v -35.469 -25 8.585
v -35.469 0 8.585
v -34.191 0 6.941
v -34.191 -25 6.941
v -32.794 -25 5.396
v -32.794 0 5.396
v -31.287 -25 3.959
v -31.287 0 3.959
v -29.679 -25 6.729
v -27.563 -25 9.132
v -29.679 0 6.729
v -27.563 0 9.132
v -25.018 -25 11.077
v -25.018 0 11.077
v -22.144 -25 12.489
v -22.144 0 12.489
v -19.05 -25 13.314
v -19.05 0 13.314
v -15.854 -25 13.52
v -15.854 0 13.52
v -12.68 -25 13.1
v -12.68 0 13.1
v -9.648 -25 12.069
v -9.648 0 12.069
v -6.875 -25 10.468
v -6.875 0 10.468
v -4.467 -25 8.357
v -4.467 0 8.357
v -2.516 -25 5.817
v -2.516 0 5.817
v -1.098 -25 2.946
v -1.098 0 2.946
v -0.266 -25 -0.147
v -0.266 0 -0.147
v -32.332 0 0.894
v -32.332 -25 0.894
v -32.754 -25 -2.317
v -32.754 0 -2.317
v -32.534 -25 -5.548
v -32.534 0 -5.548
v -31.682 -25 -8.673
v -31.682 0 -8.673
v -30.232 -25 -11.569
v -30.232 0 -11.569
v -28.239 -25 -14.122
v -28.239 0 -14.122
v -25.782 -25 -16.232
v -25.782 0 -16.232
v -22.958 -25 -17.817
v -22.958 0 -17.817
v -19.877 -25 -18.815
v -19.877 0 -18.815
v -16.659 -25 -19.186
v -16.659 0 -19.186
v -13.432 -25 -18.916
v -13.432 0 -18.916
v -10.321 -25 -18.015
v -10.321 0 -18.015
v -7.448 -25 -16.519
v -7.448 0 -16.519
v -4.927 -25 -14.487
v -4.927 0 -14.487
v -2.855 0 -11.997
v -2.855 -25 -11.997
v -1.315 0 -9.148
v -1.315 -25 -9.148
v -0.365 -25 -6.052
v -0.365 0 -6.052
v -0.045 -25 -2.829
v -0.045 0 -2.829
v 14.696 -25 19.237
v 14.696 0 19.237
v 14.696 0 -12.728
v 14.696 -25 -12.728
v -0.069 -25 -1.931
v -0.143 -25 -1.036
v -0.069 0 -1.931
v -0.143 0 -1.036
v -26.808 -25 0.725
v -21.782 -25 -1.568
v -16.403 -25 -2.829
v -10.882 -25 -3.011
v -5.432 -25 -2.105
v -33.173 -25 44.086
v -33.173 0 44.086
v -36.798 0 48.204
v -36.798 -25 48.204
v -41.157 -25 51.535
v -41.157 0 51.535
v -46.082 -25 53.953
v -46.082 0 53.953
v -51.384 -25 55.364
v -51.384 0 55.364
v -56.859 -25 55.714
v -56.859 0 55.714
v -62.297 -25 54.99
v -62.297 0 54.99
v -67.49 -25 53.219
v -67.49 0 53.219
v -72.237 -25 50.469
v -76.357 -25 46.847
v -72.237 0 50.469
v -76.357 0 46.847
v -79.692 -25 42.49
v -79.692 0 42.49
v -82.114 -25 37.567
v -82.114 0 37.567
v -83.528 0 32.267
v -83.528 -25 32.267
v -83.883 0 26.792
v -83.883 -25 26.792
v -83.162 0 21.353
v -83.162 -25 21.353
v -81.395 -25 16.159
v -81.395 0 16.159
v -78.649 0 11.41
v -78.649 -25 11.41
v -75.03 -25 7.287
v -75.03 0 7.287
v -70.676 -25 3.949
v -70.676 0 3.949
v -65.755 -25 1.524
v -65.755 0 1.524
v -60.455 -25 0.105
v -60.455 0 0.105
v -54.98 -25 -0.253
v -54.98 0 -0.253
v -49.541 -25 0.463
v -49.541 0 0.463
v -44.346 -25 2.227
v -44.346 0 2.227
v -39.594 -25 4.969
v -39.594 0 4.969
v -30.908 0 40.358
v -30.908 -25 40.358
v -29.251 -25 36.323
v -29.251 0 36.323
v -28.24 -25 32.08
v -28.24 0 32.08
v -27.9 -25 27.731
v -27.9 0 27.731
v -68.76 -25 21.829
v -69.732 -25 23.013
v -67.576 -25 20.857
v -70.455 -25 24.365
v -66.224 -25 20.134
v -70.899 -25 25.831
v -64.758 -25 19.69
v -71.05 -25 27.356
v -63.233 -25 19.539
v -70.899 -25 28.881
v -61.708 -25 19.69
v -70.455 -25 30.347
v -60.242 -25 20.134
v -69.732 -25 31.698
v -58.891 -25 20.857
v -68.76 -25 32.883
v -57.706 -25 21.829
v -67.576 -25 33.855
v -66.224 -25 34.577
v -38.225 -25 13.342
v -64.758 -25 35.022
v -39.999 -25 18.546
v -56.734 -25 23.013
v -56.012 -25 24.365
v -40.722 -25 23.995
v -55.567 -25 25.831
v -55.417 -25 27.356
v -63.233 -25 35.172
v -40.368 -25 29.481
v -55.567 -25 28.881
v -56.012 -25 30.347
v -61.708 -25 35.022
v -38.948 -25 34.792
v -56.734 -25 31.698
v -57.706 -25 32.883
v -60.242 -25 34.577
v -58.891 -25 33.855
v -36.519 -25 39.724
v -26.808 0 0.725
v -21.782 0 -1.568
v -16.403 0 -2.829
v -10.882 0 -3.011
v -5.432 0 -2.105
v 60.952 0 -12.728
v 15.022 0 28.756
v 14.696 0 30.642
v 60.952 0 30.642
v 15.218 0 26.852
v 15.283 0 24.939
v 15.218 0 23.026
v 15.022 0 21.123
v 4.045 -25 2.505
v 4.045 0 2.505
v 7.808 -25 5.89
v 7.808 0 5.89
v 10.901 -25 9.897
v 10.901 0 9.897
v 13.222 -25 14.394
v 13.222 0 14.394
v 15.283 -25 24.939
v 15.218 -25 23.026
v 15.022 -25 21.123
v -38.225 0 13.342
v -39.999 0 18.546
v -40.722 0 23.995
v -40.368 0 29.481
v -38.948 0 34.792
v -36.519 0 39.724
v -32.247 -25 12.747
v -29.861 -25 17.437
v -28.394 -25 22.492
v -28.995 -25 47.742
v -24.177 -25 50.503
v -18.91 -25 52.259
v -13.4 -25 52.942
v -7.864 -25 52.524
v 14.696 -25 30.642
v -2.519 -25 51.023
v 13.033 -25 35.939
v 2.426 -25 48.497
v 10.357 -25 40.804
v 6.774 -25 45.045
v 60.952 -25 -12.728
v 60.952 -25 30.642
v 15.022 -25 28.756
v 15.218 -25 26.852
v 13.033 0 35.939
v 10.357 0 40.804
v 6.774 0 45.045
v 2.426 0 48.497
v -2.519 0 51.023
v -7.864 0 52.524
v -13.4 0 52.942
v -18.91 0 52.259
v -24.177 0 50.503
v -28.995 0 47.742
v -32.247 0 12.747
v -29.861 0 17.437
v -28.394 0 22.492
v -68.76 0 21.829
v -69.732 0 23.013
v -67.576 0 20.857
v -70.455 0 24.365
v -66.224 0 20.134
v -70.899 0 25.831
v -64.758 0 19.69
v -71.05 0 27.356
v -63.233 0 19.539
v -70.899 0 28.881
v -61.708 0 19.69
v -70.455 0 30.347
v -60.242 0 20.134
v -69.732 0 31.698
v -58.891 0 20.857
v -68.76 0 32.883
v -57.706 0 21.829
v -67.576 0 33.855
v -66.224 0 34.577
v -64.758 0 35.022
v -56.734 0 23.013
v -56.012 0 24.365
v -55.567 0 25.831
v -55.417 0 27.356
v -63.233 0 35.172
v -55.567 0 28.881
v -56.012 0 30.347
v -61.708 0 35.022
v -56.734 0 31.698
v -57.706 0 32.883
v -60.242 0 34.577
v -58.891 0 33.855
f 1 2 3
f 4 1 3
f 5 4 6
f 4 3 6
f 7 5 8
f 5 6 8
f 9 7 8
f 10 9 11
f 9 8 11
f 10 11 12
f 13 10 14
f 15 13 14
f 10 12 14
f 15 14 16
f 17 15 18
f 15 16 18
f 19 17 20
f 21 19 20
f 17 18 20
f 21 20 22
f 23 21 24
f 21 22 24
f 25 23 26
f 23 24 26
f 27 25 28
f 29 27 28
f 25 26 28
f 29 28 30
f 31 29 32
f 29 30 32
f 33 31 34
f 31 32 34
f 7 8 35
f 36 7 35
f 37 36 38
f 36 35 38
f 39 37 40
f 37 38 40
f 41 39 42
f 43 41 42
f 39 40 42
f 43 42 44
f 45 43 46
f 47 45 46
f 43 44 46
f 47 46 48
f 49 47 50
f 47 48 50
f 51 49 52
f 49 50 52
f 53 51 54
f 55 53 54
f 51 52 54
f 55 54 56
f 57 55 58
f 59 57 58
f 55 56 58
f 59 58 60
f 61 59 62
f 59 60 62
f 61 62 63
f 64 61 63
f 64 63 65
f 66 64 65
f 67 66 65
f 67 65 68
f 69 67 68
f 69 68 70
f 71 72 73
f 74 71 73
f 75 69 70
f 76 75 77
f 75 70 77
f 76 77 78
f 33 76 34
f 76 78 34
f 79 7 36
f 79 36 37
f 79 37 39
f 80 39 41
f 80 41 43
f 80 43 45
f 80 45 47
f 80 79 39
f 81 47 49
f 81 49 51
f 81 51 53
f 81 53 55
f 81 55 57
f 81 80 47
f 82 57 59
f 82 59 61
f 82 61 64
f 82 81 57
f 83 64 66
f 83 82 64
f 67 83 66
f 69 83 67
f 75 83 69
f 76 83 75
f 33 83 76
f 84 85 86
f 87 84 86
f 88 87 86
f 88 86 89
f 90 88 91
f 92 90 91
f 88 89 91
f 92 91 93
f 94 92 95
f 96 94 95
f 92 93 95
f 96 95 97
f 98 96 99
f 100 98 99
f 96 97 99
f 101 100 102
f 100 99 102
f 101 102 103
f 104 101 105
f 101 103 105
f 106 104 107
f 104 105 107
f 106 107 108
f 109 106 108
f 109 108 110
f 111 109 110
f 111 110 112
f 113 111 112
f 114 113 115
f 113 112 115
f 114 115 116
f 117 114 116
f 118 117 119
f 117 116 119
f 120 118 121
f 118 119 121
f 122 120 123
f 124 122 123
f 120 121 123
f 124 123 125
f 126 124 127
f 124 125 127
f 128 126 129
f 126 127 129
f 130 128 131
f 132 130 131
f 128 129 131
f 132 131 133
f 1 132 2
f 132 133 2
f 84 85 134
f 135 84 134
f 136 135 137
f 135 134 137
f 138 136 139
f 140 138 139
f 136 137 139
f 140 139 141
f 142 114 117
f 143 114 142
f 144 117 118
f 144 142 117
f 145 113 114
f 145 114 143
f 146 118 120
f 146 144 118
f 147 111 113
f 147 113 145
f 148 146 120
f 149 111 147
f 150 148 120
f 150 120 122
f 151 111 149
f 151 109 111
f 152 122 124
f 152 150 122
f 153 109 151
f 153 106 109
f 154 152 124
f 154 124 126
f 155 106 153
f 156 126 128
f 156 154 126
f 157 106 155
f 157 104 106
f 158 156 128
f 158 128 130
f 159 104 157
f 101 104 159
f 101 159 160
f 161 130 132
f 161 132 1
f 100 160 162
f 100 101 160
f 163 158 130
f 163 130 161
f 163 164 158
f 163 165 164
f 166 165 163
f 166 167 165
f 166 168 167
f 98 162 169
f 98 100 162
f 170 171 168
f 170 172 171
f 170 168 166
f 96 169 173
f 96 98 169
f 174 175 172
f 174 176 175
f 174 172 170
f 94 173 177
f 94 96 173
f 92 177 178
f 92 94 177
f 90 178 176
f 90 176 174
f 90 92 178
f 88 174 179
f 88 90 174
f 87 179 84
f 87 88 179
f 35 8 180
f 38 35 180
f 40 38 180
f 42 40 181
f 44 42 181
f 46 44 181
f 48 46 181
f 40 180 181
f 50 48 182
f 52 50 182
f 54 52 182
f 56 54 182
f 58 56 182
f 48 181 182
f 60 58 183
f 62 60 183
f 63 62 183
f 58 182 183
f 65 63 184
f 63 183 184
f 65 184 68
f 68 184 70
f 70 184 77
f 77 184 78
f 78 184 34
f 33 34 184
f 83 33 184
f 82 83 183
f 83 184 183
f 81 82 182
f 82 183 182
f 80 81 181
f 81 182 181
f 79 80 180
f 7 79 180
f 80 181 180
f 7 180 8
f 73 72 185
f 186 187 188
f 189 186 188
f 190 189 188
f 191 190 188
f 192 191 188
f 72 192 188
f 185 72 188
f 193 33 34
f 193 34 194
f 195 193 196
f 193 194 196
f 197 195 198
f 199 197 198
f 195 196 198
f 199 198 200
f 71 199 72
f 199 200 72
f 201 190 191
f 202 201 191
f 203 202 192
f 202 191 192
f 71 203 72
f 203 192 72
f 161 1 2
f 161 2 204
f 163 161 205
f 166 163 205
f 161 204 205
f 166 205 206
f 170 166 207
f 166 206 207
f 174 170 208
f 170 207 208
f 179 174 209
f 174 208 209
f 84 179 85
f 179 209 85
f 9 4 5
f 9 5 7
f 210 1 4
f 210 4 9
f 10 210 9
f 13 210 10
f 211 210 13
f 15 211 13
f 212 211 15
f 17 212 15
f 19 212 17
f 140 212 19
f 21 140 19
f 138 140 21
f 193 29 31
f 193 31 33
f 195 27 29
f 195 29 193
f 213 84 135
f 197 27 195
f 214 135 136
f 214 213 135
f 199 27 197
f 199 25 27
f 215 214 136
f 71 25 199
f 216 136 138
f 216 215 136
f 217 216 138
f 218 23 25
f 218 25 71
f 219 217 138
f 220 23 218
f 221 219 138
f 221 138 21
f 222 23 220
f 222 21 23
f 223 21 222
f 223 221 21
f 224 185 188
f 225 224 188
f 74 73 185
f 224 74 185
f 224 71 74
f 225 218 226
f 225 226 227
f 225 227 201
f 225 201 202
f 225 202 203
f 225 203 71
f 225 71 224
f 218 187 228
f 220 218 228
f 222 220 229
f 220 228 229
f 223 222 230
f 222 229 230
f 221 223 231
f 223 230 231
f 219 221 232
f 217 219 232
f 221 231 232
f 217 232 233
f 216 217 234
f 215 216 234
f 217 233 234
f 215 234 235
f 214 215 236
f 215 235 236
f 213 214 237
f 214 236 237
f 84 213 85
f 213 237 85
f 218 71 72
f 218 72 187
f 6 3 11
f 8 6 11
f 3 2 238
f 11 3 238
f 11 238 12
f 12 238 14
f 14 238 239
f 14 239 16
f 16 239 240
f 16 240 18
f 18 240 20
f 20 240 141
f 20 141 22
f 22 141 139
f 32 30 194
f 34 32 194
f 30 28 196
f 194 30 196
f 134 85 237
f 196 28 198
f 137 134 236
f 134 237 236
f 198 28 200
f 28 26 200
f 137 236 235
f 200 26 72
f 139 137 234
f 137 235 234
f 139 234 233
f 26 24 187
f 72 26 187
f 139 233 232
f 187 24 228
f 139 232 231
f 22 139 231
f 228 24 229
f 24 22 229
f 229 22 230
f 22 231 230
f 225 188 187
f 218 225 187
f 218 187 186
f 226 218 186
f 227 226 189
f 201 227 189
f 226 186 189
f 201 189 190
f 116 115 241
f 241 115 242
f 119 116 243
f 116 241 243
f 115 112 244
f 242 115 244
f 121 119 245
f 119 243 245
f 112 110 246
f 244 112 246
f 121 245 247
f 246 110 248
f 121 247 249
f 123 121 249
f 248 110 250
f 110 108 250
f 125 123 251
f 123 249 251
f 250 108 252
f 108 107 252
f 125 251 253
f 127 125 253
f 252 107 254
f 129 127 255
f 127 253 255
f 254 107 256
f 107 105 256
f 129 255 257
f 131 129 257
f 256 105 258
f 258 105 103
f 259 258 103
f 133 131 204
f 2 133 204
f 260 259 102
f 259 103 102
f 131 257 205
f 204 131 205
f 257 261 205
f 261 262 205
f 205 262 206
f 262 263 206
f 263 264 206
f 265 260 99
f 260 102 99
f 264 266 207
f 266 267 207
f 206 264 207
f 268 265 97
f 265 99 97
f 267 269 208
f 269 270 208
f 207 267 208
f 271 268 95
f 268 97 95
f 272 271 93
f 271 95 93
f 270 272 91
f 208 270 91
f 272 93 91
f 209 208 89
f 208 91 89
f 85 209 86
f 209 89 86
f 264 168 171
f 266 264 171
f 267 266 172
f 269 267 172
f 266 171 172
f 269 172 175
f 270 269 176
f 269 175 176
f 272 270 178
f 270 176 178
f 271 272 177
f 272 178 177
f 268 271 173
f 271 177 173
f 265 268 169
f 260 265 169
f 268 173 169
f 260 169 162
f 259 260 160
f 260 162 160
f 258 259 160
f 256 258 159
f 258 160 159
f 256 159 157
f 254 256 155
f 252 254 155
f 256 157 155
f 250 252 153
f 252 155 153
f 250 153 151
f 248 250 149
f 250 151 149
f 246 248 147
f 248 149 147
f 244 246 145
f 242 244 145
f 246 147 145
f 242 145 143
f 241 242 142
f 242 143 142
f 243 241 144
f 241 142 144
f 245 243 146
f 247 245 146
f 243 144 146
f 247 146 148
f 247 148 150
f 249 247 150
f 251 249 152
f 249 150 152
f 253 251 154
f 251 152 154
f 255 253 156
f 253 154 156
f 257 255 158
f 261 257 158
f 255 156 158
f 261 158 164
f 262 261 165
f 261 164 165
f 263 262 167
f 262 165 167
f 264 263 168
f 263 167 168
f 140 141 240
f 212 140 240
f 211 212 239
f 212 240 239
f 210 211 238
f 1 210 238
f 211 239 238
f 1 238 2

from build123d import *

# Parameters (mm, degrees)
F1_DEPTH = 25
F2_R     = 7.8164950373
F3_DEPTH = 25


with BuildPart() as f1:
    # F0 (on Front) → F1 (new body)
    with BuildSketch(Plane.XZ):
        with BuildLine():
            ThreePointArc((-35.4686552222, 8.5854582539), (-40.6799664032, 26.7469051904), (-33.1728361824, 44.0858473409))
            ThreePointArc((-33.1728361824, 44.0858473409), (-83.8399010161, 29.5380689547), (-35.4686552222, 8.5854582539))
        make_face()
    extrude(amount=F1_DEPTH)

    # F2 (on face) → F3 (cut)
    with BuildSketch(Plane.XZ.offset(25)):
        with Locations((-63.233114779, 27.3558422923)):
            Circle(F2_R)
    extrude(amount=-F3_DEPTH, mode=Mode.SUBTRACT)


with BuildPart() as f1b:
    # F0 (on Front) → F1, piece 2 (new body)
    with BuildSketch(Plane.XZ):
        with BuildLine():
            ThreePointArc((-33.1728361824, 44.0858473409), (-29.250647267, 36.3230087916), (-27.8998025967, 27.7311261743))
            ThreePointArc((-27.8998025967, 27.7311261743), (-29.8606789966, 17.4373886341), (-35.4686552222, 8.5854582539))
            ThreePointArc((-35.4686552222, 8.5854582539), (-33.5068212225, 6.1555939403), (-31.2866895909, 3.9592222133))
            ThreePointArc((-31.2866895909, 3.9592222133), (-14.2566992524, 13.3878151192), (-0.2661960897, -0.1467612084))
            ThreePointArc((-0.2661960897, -0.1467612084), (9.4452785514, 7.8233094528), (14.6962815069, 19.2365357281))
            Line((14.6962815069, 19.2365357281), (14.6962815069, 30.6419162451))
            ThreePointArc((14.6962815069, 30.6419162451), (-5.1540097886, 51.9065243125), (-33.1728361824, 44.0858473409))
        make_face()
    extrude(amount=F1_DEPTH)


with BuildPart() as f1c:
    # F0 (on Front) → F1, piece 3 (new body)
    with BuildSketch(Plane.XZ):
        with BuildLine():
            ThreePointArc((-0.2661960897, -0.1467612084), (-16.4032441004, -2.8292207693), (-31.2866895909, 3.9592222133))
            ThreePointArc((-31.2866895909, 3.9592222133), (-19.8766677907, -18.8146902859), (-0.0447628813, -2.8292207693))
            ThreePointArc((-0.0447628813, -2.8292207693), (-0.10021517, -1.4834289985), (-0.2661960897, -0.1467612084))
        make_face()
    extrude(amount=F1_DEPTH)


with BuildPart() as f1d:
    # F0 (on Front) → F1, piece 4 (new body)
    with BuildSketch(Plane.XZ):
        with BuildLine():
            Line((60.9516613185, 30.6419162451), (14.6962815069, 30.6419162451))
            ThreePointArc((14.6962815069, 30.6419162451), (15.1358822884, 27.8056188964), (15.2829305244, 24.9392259866))
            ThreePointArc((15.2829305244, 24.9392259866), (15.1358822884, 22.0728330768), (14.6962815069, 19.2365357281))
            Line((14.6962815069, 19.2365357281), (14.6962815069, -12.728318572))
            Line((14.6962815069, -12.728318572), (60.9516613185, -12.728318572))
            Line((60.9516613185, -12.728318572), (60.9516613185, 30.6419162451))
        make_face()
    extrude(amount=F1_DEPTH)


solid = Compound([f1.part, f1b.part, f1c.part, f1d.part])
